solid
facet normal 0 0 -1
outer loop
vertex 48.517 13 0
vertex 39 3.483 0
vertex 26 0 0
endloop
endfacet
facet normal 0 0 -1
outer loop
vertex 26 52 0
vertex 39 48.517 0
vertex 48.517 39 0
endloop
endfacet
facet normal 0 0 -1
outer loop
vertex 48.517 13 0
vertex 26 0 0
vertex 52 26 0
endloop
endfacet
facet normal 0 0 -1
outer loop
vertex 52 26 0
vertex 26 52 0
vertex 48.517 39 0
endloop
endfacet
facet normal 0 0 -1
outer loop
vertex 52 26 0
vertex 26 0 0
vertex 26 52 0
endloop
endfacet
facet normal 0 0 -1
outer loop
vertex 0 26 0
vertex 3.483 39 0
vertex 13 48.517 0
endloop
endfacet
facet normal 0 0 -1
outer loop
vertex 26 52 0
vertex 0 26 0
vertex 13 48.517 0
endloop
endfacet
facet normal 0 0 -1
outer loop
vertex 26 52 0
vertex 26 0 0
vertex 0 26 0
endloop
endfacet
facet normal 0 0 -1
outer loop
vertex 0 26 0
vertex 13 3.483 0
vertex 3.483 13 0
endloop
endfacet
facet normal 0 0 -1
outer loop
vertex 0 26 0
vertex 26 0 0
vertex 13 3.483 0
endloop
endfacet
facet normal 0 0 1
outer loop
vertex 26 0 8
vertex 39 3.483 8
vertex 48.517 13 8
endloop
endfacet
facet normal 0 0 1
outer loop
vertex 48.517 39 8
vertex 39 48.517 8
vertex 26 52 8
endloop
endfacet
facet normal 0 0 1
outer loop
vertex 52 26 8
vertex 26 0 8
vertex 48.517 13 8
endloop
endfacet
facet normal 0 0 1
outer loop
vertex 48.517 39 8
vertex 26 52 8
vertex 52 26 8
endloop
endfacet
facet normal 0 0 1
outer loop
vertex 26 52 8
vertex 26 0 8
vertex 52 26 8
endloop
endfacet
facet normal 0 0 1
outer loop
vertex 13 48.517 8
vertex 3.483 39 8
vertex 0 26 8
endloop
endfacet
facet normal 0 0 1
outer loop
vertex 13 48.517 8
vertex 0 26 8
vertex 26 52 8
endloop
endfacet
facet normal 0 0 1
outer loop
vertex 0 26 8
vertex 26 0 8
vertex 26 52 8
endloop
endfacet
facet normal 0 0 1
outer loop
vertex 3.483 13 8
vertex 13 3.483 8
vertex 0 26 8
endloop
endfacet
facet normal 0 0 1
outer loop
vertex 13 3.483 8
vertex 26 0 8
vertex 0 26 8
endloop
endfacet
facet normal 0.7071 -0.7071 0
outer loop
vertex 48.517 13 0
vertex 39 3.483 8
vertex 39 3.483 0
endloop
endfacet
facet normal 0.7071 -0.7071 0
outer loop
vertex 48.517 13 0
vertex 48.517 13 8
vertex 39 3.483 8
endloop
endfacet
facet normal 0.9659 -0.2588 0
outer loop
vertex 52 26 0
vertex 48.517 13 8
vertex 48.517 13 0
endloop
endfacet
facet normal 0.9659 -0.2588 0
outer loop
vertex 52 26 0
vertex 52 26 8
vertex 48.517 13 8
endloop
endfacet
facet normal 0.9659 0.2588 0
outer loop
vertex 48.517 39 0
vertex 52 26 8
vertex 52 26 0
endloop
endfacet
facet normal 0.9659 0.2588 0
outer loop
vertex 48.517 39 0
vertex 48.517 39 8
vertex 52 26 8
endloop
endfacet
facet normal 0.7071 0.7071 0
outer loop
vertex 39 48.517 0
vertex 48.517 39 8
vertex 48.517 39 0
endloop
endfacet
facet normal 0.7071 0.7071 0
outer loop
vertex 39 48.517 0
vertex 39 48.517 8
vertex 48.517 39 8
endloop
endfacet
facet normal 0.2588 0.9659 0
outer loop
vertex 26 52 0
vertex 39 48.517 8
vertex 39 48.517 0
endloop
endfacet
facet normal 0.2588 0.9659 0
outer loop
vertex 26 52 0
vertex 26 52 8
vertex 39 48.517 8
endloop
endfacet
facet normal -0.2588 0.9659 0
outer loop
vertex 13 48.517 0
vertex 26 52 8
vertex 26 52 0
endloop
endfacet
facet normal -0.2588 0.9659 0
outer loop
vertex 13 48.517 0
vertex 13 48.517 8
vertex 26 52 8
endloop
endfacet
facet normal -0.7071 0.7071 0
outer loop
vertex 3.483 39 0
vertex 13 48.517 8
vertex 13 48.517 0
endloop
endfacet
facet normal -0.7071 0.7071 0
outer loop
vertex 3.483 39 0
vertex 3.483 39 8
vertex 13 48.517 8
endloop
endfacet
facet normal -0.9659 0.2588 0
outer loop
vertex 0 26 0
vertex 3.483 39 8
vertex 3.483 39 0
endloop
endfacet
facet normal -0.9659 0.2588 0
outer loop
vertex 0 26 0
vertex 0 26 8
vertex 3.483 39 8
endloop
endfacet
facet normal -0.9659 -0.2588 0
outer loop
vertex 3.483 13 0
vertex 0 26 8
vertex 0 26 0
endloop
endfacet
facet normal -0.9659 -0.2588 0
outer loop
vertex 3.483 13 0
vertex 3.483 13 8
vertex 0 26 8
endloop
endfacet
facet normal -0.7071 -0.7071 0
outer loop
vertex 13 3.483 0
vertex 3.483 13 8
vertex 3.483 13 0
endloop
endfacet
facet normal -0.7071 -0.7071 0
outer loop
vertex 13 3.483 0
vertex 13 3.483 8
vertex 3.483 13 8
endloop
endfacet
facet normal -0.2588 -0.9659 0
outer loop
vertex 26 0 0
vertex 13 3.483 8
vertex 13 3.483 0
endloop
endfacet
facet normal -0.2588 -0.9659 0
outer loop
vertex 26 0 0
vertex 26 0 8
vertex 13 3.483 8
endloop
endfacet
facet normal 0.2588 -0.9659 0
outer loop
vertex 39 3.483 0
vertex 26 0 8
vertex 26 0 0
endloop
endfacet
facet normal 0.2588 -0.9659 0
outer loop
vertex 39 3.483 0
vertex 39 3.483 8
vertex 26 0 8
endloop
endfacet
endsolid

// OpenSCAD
$fn = 32;

// ----------------------------------------------------------------------
// Eccentric disc: egg, 8 mm thick
// ----------------------------------------------------------------------

// --- parameters (mm) ---
profile_height = 8;       // extrusion height
profile_points = 12;      // points of the closed outline

profile = [[0, 26], [3.483, 13], [13, 3.483], [26, 0], [39, 3.483], [48.517, 13], [52, 26], [48.517, 39], [39, 48.517], [26, 52], [13, 48.517], [3.483, 39]];  // single closed polygon, 12 points, counter clockwise

// --- the one profile operation ---
linear_extrude(height = profile_height) polygon(points = profile);
